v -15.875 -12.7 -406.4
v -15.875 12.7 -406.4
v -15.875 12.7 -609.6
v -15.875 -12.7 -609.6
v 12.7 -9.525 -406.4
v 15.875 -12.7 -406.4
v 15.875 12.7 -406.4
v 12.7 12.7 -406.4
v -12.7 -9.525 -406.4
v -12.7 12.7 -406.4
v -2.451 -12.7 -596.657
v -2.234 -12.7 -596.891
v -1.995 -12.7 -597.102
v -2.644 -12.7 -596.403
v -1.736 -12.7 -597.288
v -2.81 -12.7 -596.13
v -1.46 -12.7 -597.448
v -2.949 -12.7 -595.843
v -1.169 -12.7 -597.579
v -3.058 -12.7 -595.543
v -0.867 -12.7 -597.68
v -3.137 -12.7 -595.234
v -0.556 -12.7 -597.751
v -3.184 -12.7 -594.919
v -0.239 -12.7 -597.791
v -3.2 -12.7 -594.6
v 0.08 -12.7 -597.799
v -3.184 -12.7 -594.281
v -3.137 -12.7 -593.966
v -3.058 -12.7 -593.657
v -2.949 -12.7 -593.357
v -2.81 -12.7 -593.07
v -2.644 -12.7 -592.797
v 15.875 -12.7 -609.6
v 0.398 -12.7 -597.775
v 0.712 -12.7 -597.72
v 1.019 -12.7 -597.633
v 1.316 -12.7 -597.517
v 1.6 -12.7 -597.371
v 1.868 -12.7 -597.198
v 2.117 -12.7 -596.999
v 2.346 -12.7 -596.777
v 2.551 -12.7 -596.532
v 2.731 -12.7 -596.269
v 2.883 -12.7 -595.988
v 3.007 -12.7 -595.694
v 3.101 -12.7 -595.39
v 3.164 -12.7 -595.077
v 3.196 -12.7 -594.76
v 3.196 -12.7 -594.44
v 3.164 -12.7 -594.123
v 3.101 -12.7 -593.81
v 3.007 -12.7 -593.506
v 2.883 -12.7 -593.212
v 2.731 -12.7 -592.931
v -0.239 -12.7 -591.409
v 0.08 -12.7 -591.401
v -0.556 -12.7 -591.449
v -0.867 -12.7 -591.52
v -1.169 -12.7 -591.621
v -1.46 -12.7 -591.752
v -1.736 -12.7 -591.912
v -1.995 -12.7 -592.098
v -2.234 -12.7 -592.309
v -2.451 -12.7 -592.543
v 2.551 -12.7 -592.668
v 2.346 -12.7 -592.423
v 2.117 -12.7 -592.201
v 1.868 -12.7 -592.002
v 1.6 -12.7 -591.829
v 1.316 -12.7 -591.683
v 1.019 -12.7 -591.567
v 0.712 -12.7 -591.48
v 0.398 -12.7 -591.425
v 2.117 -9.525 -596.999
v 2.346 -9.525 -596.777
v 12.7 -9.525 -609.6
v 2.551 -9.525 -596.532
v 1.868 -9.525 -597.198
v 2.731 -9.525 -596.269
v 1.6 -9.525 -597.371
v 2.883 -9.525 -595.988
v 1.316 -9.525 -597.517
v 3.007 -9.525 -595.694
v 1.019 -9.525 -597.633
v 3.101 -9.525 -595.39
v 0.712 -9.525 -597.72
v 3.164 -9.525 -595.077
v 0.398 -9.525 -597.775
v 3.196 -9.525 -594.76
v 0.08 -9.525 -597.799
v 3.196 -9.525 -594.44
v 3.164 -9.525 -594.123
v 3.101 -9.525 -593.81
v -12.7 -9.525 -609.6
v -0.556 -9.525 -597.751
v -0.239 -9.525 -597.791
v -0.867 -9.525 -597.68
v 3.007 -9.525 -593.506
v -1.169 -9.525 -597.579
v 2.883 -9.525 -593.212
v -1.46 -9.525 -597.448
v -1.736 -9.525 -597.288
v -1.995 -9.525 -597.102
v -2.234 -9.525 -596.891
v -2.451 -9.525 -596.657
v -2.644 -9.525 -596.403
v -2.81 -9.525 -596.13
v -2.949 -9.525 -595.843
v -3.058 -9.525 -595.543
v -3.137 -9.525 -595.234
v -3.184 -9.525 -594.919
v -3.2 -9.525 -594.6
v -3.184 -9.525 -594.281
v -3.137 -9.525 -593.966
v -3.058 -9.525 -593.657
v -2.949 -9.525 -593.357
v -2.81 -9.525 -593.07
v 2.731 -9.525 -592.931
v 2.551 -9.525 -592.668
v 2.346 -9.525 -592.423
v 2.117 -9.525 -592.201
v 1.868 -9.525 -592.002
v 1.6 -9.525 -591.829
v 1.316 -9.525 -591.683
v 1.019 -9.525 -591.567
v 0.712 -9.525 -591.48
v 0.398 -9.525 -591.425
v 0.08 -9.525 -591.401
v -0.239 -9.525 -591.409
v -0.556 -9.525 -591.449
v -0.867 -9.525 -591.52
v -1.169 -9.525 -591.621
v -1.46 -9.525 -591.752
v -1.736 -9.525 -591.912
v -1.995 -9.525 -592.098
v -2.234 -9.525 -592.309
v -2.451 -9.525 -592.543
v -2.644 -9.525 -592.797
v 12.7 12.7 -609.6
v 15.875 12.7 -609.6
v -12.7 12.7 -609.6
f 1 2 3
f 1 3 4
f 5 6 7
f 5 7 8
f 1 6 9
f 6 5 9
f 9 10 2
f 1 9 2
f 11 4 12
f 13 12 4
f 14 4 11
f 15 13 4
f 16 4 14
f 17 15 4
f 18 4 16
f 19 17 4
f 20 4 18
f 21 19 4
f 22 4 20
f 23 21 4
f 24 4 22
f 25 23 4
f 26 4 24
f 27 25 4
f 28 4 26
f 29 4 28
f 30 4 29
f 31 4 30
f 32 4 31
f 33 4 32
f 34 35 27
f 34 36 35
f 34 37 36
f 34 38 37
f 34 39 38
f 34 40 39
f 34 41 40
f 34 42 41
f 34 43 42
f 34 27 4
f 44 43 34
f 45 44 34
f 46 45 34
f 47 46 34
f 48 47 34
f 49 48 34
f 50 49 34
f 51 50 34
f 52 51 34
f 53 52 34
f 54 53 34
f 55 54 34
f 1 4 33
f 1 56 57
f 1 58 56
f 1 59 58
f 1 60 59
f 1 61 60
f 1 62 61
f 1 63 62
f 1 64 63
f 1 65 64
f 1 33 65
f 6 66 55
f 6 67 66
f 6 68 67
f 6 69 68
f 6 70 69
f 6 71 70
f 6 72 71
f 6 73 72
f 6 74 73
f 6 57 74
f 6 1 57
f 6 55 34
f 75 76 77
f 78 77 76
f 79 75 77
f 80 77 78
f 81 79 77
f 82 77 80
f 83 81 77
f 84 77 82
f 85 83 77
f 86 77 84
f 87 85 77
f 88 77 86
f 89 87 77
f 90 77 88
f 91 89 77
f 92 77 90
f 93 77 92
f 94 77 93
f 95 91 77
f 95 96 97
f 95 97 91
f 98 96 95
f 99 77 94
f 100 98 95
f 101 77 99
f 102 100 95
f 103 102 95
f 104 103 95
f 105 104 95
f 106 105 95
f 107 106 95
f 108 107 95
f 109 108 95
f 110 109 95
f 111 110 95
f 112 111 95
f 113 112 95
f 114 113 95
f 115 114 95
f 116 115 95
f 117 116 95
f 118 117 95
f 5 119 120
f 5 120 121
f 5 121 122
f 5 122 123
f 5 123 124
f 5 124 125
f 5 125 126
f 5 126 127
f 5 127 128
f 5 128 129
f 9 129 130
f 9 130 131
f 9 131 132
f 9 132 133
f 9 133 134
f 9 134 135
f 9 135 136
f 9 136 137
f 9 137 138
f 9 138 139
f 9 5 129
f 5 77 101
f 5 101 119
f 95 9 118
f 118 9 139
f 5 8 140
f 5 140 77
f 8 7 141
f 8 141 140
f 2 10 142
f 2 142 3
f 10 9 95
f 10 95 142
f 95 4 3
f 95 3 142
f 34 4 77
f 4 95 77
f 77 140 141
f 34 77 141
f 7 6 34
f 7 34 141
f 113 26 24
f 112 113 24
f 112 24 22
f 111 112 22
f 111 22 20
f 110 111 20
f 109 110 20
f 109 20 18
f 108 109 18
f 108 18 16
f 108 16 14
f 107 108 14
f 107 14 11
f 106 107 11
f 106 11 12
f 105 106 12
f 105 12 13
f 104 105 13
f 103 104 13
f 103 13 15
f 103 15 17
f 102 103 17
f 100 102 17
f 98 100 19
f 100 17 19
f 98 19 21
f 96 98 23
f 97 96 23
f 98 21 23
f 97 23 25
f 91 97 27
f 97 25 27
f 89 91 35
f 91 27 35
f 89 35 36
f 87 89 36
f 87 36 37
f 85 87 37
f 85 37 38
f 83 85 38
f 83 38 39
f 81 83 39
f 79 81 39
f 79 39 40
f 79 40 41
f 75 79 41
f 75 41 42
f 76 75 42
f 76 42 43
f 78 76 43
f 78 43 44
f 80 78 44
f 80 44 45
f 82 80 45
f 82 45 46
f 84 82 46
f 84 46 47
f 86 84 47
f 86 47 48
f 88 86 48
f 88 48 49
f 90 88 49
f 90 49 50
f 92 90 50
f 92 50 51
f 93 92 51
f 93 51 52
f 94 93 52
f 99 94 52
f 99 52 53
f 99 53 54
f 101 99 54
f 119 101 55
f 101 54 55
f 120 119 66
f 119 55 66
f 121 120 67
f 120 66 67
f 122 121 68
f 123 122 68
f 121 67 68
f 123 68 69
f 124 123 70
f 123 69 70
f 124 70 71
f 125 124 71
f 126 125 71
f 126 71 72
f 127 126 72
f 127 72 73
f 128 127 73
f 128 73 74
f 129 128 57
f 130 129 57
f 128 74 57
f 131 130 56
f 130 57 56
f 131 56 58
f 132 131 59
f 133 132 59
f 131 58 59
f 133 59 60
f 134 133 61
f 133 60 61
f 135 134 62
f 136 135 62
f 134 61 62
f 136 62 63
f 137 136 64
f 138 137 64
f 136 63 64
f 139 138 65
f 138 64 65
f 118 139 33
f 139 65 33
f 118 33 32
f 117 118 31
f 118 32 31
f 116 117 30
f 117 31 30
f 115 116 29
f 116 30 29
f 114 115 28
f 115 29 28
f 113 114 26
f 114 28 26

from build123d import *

# Parameters (mm, degrees)
BOSS_EXTRUDE2_DEPTH  = 609.6
CUT_EXTRUDE1_DEPTH   = 1016
M6_CLEARANCE_HOLE1_D = 6.4


with BuildPart() as part:
    # Sketch3 → Boss-Extrude2 (new, symmetric)
    with BuildSketch(Plane.XY):
        Polygon((-15.875, 12.7), (-15.875, -12.7), (15.875, -12.7), (15.875, 12.7), (12.7, 12.7), (12.7, -9.525), (-12.7, -9.525), (-12.7, 12.7), align=None)
    extrude(amount=BOSS_EXTRUDE2_DEPTH, both=True)

    # Sketch5 → Cut-Extrude1 (cut)
    with BuildSketch(Plane.XY.offset(609.6)):
        Polygon((-15.875, 12.7), (-12.7, 12.7), (-12.7, -9.525), (12.7, -9.525), (12.7, 12.7), (15.875, 12.7), (15.875, -12.7), (-15.875, -12.7), align=None)
    extrude(amount=-CUT_EXTRUDE1_DEPTH, mode=Mode.SUBTRACT)

    # M6 Clearance Hole1 (through all)
    with Locations(Plane(origin=(0, -9.525, 0), x_dir=(1, 0, 0), z_dir=(0, 1, 0))):
        with Locations((0, 594.6)):
            Hole(M6_CLEARANCE_HOLE1_D / 2)


solid = part.part
